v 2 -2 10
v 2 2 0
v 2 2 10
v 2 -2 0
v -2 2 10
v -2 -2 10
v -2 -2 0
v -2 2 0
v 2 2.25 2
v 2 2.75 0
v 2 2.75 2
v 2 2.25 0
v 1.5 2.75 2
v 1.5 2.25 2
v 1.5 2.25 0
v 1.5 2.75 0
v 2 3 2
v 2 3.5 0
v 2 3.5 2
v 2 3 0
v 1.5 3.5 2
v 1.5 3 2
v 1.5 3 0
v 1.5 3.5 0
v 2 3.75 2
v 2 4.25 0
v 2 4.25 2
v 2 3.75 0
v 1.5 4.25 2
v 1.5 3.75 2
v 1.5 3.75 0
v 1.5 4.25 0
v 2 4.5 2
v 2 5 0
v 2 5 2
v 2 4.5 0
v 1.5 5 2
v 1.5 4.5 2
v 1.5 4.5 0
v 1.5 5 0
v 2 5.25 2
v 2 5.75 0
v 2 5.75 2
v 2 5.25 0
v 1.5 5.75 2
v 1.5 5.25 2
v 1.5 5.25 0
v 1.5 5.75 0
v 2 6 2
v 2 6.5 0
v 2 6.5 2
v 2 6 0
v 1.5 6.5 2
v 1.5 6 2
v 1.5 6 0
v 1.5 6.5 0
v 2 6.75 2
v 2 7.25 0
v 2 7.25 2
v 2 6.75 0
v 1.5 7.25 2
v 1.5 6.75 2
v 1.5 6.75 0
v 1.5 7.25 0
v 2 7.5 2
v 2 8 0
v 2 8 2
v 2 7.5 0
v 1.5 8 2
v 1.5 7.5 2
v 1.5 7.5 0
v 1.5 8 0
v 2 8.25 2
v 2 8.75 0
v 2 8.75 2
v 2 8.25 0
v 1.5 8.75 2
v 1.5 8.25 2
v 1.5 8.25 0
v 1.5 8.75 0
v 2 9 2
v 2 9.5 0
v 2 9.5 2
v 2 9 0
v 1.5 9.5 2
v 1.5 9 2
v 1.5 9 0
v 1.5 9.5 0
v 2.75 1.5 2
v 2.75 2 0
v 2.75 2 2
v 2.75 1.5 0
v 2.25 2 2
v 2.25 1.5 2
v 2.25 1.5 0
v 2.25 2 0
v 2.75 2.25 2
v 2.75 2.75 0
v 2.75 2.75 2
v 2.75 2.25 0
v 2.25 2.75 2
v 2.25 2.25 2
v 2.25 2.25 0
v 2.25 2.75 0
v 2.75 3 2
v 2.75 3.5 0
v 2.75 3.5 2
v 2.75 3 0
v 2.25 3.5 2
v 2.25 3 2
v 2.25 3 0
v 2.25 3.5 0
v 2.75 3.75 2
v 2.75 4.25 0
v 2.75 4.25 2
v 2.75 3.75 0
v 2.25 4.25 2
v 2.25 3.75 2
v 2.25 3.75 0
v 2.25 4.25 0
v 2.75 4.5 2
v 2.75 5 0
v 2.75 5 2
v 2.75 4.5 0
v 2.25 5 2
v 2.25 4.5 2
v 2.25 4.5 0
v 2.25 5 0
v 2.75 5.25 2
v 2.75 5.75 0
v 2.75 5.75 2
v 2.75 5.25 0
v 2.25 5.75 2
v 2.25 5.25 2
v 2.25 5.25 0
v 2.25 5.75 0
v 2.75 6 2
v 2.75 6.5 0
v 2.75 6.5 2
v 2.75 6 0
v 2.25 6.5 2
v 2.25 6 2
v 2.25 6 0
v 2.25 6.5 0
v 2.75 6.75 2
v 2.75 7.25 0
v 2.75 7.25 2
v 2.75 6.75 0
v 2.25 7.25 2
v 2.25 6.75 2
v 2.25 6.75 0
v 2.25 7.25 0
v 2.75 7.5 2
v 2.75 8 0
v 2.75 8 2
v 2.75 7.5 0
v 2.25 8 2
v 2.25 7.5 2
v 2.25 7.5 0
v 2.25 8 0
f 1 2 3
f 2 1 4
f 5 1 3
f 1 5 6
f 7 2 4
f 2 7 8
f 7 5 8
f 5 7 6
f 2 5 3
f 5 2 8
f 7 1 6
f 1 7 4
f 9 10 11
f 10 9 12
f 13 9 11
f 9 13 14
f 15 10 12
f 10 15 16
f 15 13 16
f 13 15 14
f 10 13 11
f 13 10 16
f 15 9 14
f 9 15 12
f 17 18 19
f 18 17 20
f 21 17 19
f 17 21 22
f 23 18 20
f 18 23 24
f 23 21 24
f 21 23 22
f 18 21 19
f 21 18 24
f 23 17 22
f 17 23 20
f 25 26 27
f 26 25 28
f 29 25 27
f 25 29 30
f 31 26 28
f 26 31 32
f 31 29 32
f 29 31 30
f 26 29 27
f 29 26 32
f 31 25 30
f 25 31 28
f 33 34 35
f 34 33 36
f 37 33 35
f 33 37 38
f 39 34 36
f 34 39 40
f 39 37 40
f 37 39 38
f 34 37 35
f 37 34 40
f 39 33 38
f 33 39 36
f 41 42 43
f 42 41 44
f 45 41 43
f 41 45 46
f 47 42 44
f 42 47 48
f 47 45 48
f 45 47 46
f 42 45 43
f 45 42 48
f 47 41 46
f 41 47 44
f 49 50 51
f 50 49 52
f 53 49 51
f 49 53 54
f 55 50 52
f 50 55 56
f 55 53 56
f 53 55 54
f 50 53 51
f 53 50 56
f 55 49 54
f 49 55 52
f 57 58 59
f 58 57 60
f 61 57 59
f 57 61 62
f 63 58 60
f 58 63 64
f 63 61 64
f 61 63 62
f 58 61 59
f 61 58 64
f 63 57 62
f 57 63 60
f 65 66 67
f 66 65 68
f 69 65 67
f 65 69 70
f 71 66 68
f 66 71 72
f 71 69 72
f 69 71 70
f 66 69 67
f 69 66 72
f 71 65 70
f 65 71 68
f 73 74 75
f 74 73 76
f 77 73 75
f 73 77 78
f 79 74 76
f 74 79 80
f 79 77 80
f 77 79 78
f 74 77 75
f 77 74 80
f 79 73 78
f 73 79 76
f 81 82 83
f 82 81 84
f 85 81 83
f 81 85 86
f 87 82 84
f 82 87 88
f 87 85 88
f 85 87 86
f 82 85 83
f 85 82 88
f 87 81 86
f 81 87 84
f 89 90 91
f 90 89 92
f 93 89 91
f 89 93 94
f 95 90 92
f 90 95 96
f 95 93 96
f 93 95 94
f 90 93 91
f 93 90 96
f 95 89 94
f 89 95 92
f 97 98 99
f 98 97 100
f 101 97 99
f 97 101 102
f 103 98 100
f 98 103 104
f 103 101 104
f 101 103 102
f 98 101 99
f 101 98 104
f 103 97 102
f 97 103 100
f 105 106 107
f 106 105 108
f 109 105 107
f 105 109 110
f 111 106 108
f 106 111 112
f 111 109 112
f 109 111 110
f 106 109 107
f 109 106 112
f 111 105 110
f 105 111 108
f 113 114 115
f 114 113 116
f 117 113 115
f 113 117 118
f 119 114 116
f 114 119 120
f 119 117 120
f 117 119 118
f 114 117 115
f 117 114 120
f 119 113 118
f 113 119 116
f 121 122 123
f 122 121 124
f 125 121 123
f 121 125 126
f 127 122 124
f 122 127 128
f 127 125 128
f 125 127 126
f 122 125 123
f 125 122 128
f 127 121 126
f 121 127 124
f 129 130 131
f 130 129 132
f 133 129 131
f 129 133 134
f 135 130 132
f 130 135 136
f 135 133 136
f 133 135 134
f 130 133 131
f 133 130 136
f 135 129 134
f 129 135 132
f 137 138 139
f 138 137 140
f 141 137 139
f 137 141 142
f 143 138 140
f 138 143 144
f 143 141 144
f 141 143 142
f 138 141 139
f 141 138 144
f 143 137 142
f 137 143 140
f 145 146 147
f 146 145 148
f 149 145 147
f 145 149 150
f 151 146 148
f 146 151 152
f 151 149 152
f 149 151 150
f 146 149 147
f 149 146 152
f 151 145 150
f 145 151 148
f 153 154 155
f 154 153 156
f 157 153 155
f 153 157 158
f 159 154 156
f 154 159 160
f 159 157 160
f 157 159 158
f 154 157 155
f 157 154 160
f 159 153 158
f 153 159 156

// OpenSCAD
translate([0, 0, 5]) color([0,1,0,0.9]) cube([4, 4, 10], center=true);
translate([1.75, 1.75, 1]) color([1,0,0]) cube([0.5, 0.5, 2], center=true);
translate([1.75, 2.5, 1]) color([1,0,0]) cube([0.5, 0.5, 2], center=true);
translate([1.75, 3.25, 1]) color([1,0,0]) cube([0.5, 0.5, 2], center=true);
translate([1.75, 4.0, 1]) color([1,0,0]) cube([0.5, 0.5, 2], center=true);
translate([1.75, 4.75, 1]) color([1,0,0]) cube([0.5, 0.5, 2], center=true);
translate([1.75, 5.5, 1]) color([1,0,0]) cube([0.5, 0.5, 2], center=true);
translate([1.75, 6.25, 1]) color([1,0,0]) cube([0.5, 0.5, 2], center=true);
translate([1.75, 7.0, 1]) color([1,0,0]) cube([0.5, 0.5, 2], center=true);
translate([1.75, 7.75, 1]) color([1,0,0]) cube([0.5, 0.5, 2], center=true);
translate([1.75, 8.5, 1]) color([1,0,0]) cube([0.5, 0.5, 2], center=true);
translate([1.75, 9.25, 1]) color([1,0,0]) cube([0.5, 0.5, 2], center=true);
translate([2.5, 1.75, 1]) color([1,0,0]) cube([0.5, 0.5, 2], center=true);
translate([2.5, 2.5, 1]) color([1,0,0]) cube([0.5, 0.5, 2], center=true);
translate([2.5, 3.25, 1]) color([1,0,0]) cube([0.5, 0.5, 2], center=true);
translate([2.5, 4.0, 1]) color([1,0,0]) cube([0.5, 0.5, 2], center=true);
translate([2.5, 4.75, 1]) color([1,0,0]) cube([0.5, 0.5, 2], center=true);
translate([2.5, 5.5, 1]) color([1,0,0]) cube([0.5, 0.5, 2], center=true);
translate([2.5, 6.25, 1]) color([1,0,0]) cube([0.5, 0.5, 2], center=true);
translate([2.5, 7.0, 1]) color([1,0,0]) cube([0.5, 0.5, 2], center=true);
translate([2.5, 7.75, 1]) color([1,0,0]) cube([0.5, 0.5, 2], center=true);
